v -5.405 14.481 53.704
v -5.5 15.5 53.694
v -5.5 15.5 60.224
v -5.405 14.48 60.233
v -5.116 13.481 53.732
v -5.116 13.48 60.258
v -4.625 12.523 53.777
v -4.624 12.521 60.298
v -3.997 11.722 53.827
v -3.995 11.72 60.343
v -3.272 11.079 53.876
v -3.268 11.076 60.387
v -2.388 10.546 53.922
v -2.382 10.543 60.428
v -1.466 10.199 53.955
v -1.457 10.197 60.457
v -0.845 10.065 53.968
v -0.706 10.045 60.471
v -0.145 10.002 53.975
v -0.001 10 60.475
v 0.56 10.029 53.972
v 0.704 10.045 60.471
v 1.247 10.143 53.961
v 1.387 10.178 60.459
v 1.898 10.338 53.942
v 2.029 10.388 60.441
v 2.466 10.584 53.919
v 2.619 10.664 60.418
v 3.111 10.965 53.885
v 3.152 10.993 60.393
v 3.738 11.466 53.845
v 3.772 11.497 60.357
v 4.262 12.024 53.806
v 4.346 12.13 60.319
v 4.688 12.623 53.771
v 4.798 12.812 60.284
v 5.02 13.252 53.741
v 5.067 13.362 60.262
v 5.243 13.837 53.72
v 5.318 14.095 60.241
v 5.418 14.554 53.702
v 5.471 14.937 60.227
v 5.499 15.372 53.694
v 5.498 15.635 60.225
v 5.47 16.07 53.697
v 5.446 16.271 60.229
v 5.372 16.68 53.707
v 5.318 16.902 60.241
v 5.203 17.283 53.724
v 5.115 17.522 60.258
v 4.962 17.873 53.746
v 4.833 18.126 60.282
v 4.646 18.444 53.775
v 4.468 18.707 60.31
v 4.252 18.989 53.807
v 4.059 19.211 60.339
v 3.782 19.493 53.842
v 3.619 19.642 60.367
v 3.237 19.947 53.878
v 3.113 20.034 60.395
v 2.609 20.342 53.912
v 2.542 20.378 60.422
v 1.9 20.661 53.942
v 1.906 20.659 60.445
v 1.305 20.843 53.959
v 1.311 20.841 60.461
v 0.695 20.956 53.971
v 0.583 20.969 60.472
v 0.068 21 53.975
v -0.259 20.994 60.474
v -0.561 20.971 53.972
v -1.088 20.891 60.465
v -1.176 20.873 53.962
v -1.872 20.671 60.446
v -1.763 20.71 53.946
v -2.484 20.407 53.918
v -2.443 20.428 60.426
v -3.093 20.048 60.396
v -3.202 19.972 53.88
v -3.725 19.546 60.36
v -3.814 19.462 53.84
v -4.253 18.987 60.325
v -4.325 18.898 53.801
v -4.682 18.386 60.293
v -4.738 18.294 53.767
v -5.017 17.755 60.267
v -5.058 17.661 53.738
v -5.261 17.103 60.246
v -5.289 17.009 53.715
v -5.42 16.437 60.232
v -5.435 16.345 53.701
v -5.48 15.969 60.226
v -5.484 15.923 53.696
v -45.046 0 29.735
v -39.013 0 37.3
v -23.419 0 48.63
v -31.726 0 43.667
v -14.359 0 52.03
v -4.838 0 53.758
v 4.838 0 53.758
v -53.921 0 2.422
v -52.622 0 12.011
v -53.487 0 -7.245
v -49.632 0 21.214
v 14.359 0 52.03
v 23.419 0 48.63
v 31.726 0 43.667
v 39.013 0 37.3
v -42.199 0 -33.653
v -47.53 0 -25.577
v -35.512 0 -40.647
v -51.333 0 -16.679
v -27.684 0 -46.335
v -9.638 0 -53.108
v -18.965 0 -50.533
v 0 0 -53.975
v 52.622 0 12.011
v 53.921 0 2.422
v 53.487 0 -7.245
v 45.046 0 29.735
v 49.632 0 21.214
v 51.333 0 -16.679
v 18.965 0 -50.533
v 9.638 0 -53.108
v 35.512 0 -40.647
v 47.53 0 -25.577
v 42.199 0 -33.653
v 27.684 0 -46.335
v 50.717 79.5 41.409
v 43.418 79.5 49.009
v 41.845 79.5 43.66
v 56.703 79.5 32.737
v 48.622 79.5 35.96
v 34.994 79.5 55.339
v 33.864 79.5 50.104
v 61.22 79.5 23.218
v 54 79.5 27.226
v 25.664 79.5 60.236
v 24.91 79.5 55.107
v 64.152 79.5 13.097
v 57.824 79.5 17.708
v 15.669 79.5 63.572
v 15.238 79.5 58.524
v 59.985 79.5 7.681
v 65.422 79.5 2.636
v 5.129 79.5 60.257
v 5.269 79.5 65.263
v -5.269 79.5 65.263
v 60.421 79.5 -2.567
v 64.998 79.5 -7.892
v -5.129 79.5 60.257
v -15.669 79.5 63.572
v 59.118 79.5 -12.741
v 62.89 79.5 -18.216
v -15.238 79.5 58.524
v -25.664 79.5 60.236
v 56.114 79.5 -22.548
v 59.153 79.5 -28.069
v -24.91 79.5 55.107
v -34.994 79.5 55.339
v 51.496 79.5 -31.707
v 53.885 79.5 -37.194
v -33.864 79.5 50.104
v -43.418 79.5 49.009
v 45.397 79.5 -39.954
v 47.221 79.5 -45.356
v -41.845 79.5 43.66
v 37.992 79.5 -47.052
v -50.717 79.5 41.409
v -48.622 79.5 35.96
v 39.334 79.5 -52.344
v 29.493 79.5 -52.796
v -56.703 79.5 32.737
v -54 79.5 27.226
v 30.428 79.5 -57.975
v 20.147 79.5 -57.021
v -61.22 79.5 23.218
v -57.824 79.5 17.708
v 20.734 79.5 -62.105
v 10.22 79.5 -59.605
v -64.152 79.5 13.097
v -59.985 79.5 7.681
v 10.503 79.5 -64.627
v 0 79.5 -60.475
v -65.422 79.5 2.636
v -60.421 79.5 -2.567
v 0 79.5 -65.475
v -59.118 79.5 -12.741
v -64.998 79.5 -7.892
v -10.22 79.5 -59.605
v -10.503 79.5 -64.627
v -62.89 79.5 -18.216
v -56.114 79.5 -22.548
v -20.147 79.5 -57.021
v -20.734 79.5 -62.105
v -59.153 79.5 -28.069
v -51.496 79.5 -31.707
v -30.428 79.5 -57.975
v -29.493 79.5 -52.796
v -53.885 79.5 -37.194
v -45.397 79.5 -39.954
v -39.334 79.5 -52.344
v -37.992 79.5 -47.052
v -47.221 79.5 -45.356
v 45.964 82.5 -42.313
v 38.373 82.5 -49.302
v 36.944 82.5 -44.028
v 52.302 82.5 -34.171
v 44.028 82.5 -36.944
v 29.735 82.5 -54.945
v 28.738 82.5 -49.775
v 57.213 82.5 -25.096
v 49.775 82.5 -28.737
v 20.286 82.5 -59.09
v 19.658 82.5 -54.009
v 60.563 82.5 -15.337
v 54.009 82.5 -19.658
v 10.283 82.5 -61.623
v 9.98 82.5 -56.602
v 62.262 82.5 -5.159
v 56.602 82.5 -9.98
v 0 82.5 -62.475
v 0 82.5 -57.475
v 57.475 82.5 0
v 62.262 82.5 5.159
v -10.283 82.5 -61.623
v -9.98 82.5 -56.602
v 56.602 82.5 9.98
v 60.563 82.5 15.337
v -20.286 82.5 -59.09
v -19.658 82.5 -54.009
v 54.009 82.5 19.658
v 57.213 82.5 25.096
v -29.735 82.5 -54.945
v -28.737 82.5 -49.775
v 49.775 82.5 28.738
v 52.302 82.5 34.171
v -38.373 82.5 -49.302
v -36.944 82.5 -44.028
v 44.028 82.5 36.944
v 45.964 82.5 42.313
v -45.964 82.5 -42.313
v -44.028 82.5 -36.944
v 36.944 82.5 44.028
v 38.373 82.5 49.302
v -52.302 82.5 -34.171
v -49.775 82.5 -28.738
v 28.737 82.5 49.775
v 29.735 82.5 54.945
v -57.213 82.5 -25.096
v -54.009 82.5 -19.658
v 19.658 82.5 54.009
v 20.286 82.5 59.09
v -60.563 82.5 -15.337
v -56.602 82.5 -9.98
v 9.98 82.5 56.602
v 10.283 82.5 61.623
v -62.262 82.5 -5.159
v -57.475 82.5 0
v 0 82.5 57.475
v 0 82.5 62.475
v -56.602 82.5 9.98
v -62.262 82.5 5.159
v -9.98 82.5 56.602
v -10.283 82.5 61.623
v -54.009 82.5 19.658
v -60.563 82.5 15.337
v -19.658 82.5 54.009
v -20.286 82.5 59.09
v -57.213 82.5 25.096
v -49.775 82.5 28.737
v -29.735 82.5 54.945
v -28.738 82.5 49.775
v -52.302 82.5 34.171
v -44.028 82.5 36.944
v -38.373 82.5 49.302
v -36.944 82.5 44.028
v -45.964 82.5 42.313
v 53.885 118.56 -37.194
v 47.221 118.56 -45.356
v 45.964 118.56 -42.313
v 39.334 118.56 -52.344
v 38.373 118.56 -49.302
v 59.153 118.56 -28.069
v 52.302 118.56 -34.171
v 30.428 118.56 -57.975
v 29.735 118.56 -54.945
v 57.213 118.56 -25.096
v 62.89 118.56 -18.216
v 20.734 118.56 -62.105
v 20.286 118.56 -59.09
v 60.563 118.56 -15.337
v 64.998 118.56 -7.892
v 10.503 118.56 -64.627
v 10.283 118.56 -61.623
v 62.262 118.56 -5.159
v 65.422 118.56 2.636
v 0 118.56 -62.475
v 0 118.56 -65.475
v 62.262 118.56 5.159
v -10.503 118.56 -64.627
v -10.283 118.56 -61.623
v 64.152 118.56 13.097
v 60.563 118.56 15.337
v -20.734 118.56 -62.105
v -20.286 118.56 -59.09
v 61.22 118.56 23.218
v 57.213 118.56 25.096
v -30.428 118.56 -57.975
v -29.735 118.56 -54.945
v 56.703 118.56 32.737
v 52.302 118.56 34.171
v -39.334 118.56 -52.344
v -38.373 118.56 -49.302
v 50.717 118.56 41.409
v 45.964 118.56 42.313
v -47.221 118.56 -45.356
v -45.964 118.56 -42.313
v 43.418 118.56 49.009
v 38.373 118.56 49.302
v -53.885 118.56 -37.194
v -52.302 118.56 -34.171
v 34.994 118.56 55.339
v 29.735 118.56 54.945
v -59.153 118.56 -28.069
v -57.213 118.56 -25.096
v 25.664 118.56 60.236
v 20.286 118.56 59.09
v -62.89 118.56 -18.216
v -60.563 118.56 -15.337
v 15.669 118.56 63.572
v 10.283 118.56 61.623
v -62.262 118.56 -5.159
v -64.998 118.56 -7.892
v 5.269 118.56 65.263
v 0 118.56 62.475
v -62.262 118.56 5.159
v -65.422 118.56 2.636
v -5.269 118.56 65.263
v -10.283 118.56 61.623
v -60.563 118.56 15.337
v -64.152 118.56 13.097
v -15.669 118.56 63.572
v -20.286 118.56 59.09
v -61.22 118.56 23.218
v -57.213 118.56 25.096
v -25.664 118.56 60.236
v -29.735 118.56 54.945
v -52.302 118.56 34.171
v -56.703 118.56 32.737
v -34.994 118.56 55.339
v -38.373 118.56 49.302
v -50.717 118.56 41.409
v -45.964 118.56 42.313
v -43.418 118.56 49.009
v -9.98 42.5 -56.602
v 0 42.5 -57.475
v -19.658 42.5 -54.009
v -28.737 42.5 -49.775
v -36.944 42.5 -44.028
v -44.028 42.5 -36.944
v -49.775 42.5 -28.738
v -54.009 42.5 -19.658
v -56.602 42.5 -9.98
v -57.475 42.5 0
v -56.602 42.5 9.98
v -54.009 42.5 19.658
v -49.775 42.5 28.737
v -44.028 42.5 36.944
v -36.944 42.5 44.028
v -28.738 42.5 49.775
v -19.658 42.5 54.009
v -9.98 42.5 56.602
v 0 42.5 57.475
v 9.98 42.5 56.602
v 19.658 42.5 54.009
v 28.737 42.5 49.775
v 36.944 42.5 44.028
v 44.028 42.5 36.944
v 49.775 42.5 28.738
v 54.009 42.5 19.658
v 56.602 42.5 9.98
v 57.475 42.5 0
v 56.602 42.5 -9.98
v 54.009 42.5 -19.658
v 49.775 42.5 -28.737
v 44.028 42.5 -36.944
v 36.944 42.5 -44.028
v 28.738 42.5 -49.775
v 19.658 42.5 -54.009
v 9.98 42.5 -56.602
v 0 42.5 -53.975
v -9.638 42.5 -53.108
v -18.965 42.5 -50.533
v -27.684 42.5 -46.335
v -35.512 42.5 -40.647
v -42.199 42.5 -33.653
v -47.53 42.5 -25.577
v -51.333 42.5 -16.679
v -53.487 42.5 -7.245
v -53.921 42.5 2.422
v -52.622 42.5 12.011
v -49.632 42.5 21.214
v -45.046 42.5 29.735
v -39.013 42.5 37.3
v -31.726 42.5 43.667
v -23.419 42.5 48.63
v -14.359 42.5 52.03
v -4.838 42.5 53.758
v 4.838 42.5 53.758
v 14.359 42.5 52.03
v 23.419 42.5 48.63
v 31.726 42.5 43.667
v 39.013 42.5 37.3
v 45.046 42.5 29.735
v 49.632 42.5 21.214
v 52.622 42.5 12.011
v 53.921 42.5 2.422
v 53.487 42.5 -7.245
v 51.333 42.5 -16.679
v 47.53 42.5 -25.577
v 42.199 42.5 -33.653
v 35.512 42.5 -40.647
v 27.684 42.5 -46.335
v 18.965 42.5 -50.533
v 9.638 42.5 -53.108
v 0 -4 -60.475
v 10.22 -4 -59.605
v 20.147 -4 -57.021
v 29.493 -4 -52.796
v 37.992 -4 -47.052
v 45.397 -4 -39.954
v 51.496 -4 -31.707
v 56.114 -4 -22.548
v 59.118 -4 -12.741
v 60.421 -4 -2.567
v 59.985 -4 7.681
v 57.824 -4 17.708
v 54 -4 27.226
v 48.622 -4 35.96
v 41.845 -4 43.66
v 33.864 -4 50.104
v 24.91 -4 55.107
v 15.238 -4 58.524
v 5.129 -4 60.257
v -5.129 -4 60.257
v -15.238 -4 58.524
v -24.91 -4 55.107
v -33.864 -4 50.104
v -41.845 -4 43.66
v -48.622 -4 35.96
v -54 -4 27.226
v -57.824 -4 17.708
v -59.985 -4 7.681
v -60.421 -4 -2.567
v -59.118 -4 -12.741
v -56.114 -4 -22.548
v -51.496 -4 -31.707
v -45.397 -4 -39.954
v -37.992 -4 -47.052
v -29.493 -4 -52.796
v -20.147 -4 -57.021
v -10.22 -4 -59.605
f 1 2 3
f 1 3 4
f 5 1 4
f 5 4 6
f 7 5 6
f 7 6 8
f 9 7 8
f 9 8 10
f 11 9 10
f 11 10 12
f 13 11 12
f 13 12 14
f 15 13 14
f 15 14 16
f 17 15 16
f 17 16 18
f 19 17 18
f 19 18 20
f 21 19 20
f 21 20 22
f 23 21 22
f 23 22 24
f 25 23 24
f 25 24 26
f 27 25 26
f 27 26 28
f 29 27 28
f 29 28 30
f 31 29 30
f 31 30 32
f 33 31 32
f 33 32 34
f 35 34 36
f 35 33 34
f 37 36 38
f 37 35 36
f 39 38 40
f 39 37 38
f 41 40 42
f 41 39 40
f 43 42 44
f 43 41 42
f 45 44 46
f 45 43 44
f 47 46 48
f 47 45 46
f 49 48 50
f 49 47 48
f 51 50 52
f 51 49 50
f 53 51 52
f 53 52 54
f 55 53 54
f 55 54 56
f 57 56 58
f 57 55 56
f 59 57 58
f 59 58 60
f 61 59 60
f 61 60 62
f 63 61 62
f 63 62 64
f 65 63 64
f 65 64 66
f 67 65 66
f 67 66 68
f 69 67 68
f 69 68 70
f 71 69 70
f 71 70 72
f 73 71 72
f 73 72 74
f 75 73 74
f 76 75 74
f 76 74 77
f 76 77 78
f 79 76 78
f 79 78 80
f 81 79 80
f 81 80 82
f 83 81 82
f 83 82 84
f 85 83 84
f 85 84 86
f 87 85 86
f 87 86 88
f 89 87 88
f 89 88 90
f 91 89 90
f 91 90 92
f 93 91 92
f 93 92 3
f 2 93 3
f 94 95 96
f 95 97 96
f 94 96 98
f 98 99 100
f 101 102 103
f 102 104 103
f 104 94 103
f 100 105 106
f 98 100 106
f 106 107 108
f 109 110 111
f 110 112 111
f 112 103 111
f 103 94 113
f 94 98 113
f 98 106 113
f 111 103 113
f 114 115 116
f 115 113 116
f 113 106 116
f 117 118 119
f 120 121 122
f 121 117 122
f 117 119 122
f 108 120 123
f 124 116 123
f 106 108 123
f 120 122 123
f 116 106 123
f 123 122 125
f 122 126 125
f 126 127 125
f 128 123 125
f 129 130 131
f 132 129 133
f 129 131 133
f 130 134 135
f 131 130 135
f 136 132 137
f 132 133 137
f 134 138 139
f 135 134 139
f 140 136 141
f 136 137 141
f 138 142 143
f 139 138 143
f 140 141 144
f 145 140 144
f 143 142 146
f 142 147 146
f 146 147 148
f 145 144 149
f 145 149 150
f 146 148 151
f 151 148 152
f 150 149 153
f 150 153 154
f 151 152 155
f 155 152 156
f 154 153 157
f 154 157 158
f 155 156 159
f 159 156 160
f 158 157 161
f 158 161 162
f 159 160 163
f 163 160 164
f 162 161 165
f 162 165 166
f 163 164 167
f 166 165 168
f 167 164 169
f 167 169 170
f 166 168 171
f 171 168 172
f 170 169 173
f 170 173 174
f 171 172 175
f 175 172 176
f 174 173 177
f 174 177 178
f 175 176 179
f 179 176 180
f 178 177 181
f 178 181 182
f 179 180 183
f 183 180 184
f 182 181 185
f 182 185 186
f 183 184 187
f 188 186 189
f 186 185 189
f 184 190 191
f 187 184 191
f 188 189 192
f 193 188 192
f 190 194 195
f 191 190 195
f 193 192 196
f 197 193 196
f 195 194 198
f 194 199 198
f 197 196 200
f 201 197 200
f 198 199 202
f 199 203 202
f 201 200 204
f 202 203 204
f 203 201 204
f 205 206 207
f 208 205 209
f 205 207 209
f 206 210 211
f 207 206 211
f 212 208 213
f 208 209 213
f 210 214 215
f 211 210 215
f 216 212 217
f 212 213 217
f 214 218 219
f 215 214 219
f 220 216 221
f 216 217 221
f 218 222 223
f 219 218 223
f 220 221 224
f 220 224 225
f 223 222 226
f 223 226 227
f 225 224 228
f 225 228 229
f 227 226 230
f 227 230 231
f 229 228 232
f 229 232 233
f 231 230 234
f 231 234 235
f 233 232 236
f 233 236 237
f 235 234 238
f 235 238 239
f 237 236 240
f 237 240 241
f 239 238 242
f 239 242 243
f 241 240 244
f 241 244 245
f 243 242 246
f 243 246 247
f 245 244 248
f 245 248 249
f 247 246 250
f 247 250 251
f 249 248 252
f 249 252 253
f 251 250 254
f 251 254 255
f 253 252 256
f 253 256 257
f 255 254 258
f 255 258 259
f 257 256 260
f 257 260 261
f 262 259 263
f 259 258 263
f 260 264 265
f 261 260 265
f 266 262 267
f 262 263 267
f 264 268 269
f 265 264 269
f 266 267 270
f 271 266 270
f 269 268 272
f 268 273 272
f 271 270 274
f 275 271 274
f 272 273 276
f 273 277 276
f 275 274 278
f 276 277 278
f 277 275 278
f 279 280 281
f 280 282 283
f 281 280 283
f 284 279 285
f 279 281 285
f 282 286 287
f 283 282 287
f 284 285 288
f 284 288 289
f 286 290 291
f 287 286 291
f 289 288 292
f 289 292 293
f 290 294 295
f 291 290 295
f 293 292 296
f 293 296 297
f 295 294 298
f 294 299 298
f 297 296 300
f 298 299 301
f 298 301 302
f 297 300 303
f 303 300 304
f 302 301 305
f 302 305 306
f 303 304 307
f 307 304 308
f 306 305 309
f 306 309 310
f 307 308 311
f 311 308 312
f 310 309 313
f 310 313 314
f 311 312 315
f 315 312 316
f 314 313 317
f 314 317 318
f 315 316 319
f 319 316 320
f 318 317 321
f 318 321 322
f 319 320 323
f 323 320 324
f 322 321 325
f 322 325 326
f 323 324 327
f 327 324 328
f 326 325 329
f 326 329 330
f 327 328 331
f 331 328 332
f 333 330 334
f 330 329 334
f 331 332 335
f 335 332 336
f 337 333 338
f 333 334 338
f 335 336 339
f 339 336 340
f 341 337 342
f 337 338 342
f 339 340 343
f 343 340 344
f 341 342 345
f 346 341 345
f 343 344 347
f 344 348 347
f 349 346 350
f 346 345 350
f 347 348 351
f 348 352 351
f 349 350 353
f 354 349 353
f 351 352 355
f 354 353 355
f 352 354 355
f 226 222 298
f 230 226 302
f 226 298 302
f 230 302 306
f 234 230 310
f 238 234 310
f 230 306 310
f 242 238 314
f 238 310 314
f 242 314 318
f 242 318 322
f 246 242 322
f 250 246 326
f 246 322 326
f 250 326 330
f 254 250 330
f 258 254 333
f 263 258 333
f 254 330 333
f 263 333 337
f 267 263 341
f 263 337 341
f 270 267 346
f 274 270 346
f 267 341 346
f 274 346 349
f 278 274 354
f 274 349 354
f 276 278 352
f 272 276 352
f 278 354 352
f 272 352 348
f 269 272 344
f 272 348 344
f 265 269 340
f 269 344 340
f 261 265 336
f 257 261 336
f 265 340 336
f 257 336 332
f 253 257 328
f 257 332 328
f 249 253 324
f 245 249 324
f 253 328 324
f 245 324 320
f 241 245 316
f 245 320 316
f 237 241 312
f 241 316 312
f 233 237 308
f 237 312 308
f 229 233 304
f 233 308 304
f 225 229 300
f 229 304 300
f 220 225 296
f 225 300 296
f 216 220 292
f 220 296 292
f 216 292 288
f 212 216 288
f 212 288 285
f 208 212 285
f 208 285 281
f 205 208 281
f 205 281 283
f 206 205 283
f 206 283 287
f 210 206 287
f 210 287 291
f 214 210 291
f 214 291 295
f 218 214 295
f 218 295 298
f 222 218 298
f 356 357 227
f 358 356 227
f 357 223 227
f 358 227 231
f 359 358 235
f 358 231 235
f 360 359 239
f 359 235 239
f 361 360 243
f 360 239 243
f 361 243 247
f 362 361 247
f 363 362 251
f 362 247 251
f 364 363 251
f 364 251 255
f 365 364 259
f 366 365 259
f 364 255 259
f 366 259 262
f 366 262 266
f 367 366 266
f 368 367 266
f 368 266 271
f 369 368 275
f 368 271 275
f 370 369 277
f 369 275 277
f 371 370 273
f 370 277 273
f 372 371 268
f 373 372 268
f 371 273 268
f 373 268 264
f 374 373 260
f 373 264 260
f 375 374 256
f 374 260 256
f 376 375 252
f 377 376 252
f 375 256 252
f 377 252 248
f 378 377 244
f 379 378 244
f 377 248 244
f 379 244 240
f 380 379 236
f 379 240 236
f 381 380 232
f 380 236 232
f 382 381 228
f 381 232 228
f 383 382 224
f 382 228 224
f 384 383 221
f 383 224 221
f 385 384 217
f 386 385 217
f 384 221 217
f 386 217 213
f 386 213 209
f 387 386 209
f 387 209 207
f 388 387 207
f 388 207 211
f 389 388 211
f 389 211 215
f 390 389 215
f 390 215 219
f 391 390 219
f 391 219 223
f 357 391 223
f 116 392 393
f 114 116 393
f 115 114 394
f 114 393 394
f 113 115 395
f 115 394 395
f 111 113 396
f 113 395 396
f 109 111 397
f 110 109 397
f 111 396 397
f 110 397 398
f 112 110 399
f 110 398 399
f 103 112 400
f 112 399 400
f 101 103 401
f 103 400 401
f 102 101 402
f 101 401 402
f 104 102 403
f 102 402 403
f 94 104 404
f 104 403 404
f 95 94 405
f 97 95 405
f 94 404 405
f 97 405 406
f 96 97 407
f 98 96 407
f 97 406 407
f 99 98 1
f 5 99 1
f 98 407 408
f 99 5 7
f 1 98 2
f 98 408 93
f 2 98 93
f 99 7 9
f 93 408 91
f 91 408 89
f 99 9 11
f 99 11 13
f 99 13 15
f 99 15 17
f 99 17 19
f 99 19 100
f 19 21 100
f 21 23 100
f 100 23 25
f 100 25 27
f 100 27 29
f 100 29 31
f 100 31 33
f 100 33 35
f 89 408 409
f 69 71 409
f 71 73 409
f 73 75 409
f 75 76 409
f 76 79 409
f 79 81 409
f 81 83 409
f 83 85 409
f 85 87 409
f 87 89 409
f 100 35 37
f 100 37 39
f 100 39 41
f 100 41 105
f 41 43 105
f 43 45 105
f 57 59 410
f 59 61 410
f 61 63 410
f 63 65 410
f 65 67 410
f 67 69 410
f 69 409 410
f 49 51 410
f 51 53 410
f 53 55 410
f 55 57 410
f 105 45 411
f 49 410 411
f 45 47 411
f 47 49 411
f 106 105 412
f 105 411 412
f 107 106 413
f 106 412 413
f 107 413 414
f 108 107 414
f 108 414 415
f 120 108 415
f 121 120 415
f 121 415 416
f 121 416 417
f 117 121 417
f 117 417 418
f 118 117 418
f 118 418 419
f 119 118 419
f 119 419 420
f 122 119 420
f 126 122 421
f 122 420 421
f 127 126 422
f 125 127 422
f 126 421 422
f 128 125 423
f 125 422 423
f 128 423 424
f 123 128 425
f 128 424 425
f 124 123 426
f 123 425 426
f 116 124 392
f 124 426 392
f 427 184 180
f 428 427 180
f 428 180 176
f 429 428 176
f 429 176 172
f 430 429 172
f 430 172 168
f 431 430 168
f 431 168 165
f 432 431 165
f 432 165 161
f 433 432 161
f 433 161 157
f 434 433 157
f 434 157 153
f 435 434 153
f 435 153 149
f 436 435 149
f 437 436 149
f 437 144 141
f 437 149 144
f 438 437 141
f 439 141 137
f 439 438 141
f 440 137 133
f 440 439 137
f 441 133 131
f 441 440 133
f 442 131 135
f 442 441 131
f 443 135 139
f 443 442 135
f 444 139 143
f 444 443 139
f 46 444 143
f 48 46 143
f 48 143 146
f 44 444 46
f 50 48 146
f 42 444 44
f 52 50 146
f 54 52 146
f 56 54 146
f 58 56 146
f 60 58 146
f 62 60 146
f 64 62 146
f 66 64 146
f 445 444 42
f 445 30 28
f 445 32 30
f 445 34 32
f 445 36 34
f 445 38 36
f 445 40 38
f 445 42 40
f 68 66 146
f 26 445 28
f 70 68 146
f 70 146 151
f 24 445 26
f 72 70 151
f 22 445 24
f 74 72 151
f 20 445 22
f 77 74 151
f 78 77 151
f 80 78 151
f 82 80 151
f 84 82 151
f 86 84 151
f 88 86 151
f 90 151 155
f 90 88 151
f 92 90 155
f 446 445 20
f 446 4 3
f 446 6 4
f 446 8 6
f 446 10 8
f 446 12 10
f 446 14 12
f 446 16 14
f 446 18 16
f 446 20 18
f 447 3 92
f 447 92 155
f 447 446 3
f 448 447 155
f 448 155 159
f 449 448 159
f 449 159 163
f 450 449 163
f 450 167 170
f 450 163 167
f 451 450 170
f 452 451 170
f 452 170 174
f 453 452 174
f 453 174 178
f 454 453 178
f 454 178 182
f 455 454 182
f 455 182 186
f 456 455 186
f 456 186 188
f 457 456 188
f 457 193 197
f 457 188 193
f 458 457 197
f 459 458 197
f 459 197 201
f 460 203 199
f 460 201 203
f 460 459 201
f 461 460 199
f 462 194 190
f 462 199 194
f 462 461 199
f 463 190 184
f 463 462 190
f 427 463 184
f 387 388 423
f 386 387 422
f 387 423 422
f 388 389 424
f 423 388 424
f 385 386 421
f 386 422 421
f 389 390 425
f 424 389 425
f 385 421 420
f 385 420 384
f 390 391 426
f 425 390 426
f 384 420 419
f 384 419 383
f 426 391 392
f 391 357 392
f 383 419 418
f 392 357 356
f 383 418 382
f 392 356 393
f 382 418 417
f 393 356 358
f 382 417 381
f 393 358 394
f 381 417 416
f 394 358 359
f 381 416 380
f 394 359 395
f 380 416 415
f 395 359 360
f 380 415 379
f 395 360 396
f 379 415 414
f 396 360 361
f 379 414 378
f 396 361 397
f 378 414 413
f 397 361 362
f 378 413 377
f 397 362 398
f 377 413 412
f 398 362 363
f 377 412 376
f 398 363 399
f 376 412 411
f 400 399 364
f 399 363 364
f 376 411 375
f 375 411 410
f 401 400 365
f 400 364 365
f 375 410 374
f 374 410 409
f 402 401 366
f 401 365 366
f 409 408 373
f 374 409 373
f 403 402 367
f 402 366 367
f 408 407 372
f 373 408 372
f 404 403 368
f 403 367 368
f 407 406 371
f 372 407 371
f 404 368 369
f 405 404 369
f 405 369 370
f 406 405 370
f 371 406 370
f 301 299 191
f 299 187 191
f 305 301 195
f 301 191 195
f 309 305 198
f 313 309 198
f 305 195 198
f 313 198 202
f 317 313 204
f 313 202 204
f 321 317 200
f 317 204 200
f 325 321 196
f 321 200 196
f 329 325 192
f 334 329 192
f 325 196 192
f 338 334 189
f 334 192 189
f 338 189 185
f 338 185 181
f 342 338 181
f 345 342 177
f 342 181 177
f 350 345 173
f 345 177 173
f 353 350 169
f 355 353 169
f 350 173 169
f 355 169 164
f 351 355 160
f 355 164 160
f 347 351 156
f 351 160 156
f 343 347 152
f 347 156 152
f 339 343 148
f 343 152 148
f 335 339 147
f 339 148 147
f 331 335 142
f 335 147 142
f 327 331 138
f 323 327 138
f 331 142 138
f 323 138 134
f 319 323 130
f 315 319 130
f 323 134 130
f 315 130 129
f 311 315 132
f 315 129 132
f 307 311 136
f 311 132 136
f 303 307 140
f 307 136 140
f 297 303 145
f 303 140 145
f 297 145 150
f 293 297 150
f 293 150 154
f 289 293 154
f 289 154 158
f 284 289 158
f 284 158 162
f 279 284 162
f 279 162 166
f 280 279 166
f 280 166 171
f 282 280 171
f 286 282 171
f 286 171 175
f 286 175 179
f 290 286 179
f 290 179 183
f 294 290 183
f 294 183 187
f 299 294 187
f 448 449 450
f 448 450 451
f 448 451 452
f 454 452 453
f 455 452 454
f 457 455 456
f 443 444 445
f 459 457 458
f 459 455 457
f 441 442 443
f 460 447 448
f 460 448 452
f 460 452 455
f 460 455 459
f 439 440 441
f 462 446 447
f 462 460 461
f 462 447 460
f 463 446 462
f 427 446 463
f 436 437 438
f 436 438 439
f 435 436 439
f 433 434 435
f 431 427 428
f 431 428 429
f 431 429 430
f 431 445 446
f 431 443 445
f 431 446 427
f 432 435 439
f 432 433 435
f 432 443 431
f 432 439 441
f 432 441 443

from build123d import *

# Parameters (mm, degrees)
BOSS_EXTRUDE1_START     = 4
SKETCH3_R               = 60.475
BOSS_EXTRUDE1_DEPTH     = 4
CUT_EXTRUDE1_DEPTH      = 151.434121296
CUT_EXTRUDE1_DEPTH_BACK = 4
SKETCH5_R               = 5.5


with BuildPart() as part:
    # Sketch1 → Revolve1 (revolve)
    with BuildSketch(Plane.XY, mode=Mode.PRIVATE) as revolve1_sk:
        Polygon((53.975, 0), (53.975, 42.5), (57.475, 42.5), (57.475, 82.5), (62.475, 82.5), (62.475, 118.56), (65.475, 118.56), (65.475, 79.5), (60.475, 79.5), (60.475, 0), align=None)
    revolve(revolve1_sk.sketch.rotate(Axis((0, 0, 0), (0, 1, 0)), 90), axis=Axis((0, 0, 0), (0, 1, 0)))

    # Sketch3 → Boss-Extrude1 (add)
    with BuildSketch(Plane.XZ.offset(BOSS_EXTRUDE1_START)):
        with Locations(Location((0, 0, 0), (0, 0, 270))):
            Circle(SKETCH3_R)
    extrude(amount=-BOSS_EXTRUDE1_DEPTH)

    # Sketch5 → Cut-Extrude1 (cut, two sides: drawn at the far end of the back side and taken through both)
    with BuildSketch(Plane.XY.offset(-CUT_EXTRUDE1_DEPTH_BACK)):
        with Locations(Location((0, 15.5, 0), (0, 0, 180))):
            Circle(SKETCH5_R)
    extrude(amount=CUT_EXTRUDE1_DEPTH + CUT_EXTRUDE1_DEPTH_BACK, mode=Mode.SUBTRACT)


solid = part.part
